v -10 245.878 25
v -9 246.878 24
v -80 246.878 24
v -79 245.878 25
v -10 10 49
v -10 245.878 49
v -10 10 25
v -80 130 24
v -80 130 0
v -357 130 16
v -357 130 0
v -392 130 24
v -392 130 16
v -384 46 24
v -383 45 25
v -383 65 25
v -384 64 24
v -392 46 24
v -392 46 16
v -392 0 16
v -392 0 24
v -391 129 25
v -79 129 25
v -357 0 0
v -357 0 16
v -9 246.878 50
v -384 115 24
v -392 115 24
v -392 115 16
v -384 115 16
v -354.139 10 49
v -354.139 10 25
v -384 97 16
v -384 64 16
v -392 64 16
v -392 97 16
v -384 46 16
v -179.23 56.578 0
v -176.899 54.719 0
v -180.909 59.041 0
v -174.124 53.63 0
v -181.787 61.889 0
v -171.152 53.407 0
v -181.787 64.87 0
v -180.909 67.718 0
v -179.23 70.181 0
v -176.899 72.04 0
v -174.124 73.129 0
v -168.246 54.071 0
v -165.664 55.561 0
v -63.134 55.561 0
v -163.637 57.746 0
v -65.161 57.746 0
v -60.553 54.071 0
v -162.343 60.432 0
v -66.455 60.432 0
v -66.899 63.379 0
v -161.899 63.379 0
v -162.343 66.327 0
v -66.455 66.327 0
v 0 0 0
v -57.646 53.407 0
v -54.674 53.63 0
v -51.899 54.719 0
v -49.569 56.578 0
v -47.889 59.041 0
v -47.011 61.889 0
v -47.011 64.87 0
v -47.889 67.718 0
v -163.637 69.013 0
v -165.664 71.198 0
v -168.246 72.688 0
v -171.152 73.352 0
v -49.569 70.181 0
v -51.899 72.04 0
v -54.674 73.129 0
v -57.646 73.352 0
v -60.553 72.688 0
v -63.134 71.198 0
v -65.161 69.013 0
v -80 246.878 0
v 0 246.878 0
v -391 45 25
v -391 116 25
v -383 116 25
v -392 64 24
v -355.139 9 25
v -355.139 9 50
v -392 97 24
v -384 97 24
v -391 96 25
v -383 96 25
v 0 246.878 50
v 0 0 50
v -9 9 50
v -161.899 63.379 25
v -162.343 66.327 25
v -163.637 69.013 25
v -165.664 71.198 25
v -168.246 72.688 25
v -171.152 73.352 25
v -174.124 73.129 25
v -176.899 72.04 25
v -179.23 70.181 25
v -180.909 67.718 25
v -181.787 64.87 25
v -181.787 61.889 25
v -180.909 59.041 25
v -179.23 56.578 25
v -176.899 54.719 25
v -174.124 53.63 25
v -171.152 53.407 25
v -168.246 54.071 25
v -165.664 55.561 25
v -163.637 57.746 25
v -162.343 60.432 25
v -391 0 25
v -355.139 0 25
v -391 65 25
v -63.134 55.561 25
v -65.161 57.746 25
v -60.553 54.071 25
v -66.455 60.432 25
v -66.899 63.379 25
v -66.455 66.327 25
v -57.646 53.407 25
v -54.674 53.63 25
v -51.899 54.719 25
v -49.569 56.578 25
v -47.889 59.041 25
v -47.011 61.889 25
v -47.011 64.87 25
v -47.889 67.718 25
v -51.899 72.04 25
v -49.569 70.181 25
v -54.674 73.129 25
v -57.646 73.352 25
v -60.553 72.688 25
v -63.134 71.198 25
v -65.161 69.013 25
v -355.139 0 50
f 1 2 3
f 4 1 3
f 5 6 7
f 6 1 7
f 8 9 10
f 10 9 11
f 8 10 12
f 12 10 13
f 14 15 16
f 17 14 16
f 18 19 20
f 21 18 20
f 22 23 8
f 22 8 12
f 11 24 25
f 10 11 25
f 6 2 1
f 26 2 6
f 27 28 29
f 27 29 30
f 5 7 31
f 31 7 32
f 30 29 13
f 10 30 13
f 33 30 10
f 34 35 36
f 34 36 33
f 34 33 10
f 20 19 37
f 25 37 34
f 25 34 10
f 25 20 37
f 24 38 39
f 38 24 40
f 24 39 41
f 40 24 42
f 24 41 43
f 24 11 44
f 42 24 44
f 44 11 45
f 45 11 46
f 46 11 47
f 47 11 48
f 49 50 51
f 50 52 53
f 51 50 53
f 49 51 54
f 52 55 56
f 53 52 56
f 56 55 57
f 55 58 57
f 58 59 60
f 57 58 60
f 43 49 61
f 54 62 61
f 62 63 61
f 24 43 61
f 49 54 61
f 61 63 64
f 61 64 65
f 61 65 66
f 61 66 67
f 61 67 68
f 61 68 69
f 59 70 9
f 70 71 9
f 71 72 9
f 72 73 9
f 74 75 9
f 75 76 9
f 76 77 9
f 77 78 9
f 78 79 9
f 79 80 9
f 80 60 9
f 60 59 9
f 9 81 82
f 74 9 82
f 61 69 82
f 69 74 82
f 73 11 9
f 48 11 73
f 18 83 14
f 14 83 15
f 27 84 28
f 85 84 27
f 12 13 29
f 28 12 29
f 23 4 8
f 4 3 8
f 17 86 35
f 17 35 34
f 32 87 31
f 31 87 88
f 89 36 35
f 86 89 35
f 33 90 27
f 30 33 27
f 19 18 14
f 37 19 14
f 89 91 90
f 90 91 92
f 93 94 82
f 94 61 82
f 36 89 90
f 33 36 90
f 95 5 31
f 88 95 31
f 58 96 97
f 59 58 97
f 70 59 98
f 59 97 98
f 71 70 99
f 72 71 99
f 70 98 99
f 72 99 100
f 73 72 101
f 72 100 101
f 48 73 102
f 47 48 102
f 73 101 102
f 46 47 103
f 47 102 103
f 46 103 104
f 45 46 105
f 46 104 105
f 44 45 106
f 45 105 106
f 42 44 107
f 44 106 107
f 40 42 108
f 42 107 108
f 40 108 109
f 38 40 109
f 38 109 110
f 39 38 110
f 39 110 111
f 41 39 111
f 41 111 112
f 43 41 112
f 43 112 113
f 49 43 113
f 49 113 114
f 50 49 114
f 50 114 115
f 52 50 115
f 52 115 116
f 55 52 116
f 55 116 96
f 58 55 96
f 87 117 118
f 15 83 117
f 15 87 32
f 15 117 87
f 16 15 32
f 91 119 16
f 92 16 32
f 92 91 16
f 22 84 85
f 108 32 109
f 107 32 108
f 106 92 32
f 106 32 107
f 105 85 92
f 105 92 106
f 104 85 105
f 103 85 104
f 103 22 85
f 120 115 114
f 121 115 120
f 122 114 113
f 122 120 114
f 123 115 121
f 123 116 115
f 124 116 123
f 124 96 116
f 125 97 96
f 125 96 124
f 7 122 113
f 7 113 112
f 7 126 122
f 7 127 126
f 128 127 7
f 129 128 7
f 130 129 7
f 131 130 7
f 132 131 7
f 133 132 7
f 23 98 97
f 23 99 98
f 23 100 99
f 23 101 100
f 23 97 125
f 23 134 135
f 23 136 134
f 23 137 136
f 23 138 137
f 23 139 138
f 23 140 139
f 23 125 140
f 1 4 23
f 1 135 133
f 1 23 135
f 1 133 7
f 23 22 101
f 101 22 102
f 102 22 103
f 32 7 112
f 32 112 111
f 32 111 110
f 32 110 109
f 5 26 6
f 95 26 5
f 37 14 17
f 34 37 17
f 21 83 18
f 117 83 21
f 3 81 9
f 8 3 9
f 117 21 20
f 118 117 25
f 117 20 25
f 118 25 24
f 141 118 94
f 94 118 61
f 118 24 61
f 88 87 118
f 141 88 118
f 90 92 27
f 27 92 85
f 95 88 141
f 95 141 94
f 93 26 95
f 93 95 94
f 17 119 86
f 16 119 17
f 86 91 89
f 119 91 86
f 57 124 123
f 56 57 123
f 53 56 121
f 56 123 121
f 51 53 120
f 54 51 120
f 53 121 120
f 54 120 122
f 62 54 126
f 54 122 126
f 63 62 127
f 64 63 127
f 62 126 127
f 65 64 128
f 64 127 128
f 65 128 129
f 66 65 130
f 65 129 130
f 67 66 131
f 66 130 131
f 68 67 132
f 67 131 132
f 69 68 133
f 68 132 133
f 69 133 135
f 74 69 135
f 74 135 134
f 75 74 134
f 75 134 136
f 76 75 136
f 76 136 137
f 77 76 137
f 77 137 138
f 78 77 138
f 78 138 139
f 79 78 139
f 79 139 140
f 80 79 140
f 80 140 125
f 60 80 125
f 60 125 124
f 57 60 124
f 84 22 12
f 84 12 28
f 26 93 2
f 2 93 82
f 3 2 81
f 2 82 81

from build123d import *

# Parameters (mm, degrees)
F1_DEPTH  = 25
F2_W      = 8
F2_H      = 18
F3_DEPTH  = 25.001
F4_W      = 35
F4_H      = 16
F5_DEPTH  = 246.8787132738
F7_DEPTH  = 25
F8_SIZE   = 1
F9_SIZE   = 1
F10_SIZE  = 1
F11_SIZE  = 1
F12_SIZE  = 1
F13_R     = 10
F14_DEPTH = 25.001


with BuildPart() as f1:
    # F0 (on Top) → F1 (new body)
    with BuildSketch(Plane.XY):
        Polygon((-392, 0), (0, 0), (0, 246.8777132738), (-80, 246.8777132738), (-80, 130), (-392, 130), align=None)
    extrude(amount=F1_DEPTH)

    # F2 (on face) → F3 (cut, through all)
    with BuildSketch(Plane.XY.offset(25)):
        with Locations((-388, 106)):
            Rectangle(F2_W, F2_H)
        with Locations((-388, 55)):
            Rectangle(F2_W, F2_H)
    extrude(amount=-F3_DEPTH, mode=Mode.SUBTRACT)

    # F4 (on face) → F5 (cut, through all)
    with BuildSketch(Plane.XZ):
        with Locations((-374.5, 8)):
            Rectangle(F4_W, F4_H)
    extrude(amount=-F5_DEPTH, mode=Mode.SUBTRACT)

    # F6 (on face) → F7 (join)
    with BuildSketch(Plane.XY.offset(25)):
        Polygon((-355.1386892796, 10), (-355.1386892796, 0), (0, 0), (0, 246.8777132738), (-10, 246.8777132738), (-10, 10), align=None)
    extrude(amount=F7_DEPTH)

    # F8
    f8_edges = [f1.edges().sort_by_distance(p)[0] for p in [
        (-392, 23, 25),
        (-384, 55, 25),
        (-392, 80.5, 25),
        (-384, 106, 25),
        (-392, 122.5, 25),
        (-388, 64, 25),
        (-388, 46, 25),
        (-388, 115, 25),
        (-388, 97, 25),
    ]]
    chamfer(f8_edges, length=F8_SIZE)

    # F9
    f9_edges = [f1.edges().sort_by_distance(p)[0] for p in [
        (-235.5, 130, 25),
        (-80, 188.438857, 25),
    ]]
    chamfer(f9_edges, length=F9_SIZE)

    # F10
    f10_edges = [f1.edges().sort_by_distance(p)[0] for p in [
        (-182.569345, 10, 50),
        (-10, 128.438857, 50),
    ]]
    chamfer(f10_edges, length=F10_SIZE)

    # F11
    f11_edges = [f1.edges().sort_by_distance(p)[0] for p in [
        (-355.138689, 10, 37),
    ]]
    chamfer(f11_edges, length=F11_SIZE)

    # F12
    f12_edges = [f1.edges().sort_by_distance(p)[0] for p in [
        (-44.5, 246.877713, 25),
        (-10, 246.877713, 37),
    ]]
    chamfer(f12_edges, length=F12_SIZE)

    # F13 (on face) → F14 (cut, through all)
    with BuildSketch(Plane.XY.offset(25)):
        with BuildLine():
            ThreePointArc((-46.8990951777, 63.3794814348), (-56.8990951777, 73.3794814348), (-66.8990951777, 63.3794814348))
            ThreePointArc((-66.8990951777, 63.3794814348), (-56.8990951777, 53.3794814348), (-46.8990951777, 63.3794814348))
        make_face()
        with Locations((-171.8990951777, 63.3794814348)):
            Circle(F13_R)
    extrude(amount=-F14_DEPTH, mode=Mode.SUBTRACT)


solid = f1.part
